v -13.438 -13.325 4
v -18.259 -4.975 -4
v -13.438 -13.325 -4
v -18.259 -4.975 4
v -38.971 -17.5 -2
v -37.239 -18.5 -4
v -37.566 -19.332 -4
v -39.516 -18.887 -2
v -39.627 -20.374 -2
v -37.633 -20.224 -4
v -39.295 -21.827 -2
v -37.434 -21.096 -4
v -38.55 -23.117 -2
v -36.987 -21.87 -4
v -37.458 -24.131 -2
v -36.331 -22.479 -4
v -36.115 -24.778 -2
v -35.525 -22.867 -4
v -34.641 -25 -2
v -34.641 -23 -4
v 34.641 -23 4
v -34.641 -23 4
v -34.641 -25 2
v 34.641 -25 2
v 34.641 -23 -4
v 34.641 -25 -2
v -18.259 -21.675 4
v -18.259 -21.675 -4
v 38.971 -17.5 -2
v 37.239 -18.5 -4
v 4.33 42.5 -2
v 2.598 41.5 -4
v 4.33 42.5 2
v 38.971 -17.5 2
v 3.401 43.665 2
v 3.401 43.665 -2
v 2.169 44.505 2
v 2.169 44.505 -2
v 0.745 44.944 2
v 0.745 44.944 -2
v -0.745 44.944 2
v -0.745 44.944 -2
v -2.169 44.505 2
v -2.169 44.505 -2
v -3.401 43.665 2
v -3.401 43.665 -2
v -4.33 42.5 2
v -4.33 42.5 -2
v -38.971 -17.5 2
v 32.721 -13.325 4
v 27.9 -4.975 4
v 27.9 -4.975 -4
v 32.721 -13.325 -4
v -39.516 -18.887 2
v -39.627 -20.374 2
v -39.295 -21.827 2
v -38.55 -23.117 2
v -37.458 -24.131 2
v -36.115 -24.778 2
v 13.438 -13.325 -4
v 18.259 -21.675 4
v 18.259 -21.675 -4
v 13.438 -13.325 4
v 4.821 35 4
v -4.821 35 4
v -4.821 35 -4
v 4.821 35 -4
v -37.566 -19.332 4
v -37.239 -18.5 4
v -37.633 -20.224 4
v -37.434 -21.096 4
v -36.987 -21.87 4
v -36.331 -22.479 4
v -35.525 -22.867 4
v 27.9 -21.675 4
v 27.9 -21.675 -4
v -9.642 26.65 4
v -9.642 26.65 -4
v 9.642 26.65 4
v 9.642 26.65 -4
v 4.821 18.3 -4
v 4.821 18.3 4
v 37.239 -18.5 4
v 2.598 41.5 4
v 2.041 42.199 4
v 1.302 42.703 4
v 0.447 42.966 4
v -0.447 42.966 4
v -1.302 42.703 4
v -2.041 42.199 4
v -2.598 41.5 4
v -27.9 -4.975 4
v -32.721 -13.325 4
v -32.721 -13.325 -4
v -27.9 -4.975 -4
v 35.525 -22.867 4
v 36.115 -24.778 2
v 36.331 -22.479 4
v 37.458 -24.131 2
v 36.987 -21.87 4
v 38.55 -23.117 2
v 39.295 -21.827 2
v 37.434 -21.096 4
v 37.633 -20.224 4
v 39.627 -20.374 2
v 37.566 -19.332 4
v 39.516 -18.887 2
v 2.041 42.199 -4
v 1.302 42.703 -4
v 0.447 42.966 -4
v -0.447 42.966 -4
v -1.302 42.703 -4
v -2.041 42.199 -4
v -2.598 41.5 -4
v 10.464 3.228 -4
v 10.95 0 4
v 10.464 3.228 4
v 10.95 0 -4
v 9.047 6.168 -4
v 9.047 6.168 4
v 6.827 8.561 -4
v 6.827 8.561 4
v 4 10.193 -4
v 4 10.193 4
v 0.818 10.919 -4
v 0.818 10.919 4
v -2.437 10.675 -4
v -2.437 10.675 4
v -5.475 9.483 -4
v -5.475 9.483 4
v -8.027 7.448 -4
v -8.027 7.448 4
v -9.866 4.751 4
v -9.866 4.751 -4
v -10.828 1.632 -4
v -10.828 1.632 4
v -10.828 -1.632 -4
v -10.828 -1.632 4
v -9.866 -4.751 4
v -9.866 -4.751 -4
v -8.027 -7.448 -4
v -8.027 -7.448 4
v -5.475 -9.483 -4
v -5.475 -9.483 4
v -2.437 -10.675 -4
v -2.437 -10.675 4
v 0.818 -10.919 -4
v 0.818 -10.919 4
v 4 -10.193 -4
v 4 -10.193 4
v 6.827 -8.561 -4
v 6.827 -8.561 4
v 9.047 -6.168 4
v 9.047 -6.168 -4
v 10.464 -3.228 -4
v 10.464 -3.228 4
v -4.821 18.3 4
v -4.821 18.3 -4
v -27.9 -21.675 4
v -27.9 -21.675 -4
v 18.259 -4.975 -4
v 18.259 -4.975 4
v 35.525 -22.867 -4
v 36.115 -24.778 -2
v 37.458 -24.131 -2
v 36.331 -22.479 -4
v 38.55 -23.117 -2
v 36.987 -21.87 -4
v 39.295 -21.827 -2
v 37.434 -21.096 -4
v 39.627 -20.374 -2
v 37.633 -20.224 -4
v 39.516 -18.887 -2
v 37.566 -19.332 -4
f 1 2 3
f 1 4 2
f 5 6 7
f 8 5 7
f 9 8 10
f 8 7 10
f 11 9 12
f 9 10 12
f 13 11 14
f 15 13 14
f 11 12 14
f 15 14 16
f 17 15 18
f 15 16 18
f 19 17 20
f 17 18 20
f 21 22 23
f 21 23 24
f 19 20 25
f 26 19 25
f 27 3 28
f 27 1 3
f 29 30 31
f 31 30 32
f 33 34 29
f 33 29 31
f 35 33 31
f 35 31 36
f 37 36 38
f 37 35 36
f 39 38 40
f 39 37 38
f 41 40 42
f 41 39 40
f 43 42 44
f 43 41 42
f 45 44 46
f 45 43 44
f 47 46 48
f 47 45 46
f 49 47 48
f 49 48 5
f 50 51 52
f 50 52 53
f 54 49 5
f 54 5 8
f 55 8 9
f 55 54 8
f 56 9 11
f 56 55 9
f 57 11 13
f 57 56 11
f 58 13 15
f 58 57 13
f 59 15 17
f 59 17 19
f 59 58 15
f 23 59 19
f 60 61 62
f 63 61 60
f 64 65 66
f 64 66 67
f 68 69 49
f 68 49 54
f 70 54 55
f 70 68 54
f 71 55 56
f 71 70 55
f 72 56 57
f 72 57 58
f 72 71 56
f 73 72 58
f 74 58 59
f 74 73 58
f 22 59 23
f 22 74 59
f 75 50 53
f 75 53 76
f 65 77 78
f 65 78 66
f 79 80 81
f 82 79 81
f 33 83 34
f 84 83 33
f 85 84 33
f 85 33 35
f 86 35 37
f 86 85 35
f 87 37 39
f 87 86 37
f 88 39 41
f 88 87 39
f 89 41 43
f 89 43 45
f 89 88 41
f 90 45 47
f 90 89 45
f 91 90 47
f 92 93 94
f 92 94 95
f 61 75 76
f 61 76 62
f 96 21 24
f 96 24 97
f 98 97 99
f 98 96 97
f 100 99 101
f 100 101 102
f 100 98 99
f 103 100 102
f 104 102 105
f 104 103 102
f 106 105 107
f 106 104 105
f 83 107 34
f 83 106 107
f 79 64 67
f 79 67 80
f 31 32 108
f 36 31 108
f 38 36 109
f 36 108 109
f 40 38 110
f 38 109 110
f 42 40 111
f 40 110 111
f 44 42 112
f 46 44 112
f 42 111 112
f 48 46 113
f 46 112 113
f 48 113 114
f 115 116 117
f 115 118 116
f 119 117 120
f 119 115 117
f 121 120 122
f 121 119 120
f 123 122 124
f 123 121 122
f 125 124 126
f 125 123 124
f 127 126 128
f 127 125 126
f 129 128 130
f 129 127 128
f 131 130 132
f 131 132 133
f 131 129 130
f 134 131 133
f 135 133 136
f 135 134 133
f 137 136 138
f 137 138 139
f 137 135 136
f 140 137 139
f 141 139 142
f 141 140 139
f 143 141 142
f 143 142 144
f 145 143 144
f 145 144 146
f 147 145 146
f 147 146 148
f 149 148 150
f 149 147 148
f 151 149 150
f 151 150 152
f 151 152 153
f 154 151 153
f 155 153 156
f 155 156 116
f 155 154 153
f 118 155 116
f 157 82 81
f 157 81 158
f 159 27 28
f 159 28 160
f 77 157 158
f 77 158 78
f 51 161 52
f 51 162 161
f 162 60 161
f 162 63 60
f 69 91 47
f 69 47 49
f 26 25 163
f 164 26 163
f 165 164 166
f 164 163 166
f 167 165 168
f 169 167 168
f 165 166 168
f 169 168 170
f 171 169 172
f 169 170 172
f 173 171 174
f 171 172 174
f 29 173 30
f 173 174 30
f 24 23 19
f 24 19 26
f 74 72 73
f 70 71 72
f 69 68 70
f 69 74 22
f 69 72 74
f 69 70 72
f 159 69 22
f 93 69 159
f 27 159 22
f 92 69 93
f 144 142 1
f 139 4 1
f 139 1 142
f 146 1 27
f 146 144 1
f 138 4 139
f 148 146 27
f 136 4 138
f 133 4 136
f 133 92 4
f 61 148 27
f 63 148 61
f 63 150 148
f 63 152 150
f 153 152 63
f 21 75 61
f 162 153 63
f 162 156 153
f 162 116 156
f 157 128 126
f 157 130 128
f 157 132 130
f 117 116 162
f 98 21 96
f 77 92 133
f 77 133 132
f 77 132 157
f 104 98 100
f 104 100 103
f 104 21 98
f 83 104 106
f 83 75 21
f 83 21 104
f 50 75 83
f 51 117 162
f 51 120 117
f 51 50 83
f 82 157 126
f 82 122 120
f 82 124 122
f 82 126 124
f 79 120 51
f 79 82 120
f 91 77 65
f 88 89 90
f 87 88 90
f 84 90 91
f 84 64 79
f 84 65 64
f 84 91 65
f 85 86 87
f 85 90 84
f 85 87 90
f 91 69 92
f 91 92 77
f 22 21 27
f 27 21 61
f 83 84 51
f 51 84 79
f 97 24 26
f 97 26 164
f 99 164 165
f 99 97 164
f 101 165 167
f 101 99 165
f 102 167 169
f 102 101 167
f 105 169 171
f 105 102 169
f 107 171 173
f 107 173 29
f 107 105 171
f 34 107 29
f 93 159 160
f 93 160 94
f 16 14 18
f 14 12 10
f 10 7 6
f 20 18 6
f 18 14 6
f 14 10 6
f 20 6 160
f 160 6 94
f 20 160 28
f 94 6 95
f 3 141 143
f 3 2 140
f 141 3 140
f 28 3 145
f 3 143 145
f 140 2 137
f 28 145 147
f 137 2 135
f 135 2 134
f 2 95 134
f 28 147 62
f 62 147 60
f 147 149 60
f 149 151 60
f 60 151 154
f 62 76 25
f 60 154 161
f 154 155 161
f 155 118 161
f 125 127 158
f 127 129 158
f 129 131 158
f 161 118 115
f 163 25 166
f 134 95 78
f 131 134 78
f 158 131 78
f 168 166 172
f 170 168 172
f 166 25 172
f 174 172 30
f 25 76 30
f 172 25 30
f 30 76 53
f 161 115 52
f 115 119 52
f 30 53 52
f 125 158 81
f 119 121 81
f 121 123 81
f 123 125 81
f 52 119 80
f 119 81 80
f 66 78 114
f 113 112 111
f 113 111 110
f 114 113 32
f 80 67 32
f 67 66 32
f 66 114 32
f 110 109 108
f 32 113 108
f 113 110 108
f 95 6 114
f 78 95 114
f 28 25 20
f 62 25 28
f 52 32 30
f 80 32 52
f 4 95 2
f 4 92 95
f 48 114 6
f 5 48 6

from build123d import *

# Parameters (mm, degrees)
F0_R     = 10.95
F1_DEPTH = 4
F2_SIZE  = 2


with BuildPart() as f1:
    # F0 (on Top) → F1 (new body, symmetric)
    with BuildSketch(Plane.XY):
        with BuildLine():
            Line((38.971143, -17.5), (4.330127, 42.5))
            ThreePointArc((4.330127, 42.5), (0, 45), (-4.330127, 42.5))
            Line((-4.330127, 42.5), (-38.971143, -17.5))
            ThreePointArc((-38.971143, -17.5), (-38.971143, -22.5), (-34.641016, -25))
            Line((-34.641016, -25), (34.641016, -25))
            ThreePointArc((34.641016, -25), (38.971143, -22.5), (38.971143, -17.5))
        make_face()
        Polygon((-18.258702, -21.675), (-27.900452, -21.675), (-32.721327, -13.325), (-27.900452, -4.975), (-18.258702, -4.975), (-13.437828, -13.325), align=None, mode=Mode.SUBTRACT)
        Circle(F0_R, mode=Mode.SUBTRACT)
        Polygon((27.900452, -4.975), (32.721327, -13.325), (27.900452, -21.675), (18.258702, -21.675), (13.437828, -13.325), (18.258702, -4.975), align=None, mode=Mode.SUBTRACT)
        Polygon((9.641749, 26.65), (4.820875, 18.3), (-4.820875, 18.3), (-9.641749, 26.65), (-4.820875, 35), (4.820875, 35), align=None, mode=Mode.SUBTRACT)
    extrude(amount=F1_DEPTH, both=True)

    # F2
    f2_edges = [f1.edges().sort_by_distance(p)[0] for p in [
        (-21.650635, 12.5, 4),
        (21.650635, 12.5, 4),
        (-21.650635, 12.5, -4),
    ]]
    chamfer(f2_edges, length=F2_SIZE)


solid = f1.part
